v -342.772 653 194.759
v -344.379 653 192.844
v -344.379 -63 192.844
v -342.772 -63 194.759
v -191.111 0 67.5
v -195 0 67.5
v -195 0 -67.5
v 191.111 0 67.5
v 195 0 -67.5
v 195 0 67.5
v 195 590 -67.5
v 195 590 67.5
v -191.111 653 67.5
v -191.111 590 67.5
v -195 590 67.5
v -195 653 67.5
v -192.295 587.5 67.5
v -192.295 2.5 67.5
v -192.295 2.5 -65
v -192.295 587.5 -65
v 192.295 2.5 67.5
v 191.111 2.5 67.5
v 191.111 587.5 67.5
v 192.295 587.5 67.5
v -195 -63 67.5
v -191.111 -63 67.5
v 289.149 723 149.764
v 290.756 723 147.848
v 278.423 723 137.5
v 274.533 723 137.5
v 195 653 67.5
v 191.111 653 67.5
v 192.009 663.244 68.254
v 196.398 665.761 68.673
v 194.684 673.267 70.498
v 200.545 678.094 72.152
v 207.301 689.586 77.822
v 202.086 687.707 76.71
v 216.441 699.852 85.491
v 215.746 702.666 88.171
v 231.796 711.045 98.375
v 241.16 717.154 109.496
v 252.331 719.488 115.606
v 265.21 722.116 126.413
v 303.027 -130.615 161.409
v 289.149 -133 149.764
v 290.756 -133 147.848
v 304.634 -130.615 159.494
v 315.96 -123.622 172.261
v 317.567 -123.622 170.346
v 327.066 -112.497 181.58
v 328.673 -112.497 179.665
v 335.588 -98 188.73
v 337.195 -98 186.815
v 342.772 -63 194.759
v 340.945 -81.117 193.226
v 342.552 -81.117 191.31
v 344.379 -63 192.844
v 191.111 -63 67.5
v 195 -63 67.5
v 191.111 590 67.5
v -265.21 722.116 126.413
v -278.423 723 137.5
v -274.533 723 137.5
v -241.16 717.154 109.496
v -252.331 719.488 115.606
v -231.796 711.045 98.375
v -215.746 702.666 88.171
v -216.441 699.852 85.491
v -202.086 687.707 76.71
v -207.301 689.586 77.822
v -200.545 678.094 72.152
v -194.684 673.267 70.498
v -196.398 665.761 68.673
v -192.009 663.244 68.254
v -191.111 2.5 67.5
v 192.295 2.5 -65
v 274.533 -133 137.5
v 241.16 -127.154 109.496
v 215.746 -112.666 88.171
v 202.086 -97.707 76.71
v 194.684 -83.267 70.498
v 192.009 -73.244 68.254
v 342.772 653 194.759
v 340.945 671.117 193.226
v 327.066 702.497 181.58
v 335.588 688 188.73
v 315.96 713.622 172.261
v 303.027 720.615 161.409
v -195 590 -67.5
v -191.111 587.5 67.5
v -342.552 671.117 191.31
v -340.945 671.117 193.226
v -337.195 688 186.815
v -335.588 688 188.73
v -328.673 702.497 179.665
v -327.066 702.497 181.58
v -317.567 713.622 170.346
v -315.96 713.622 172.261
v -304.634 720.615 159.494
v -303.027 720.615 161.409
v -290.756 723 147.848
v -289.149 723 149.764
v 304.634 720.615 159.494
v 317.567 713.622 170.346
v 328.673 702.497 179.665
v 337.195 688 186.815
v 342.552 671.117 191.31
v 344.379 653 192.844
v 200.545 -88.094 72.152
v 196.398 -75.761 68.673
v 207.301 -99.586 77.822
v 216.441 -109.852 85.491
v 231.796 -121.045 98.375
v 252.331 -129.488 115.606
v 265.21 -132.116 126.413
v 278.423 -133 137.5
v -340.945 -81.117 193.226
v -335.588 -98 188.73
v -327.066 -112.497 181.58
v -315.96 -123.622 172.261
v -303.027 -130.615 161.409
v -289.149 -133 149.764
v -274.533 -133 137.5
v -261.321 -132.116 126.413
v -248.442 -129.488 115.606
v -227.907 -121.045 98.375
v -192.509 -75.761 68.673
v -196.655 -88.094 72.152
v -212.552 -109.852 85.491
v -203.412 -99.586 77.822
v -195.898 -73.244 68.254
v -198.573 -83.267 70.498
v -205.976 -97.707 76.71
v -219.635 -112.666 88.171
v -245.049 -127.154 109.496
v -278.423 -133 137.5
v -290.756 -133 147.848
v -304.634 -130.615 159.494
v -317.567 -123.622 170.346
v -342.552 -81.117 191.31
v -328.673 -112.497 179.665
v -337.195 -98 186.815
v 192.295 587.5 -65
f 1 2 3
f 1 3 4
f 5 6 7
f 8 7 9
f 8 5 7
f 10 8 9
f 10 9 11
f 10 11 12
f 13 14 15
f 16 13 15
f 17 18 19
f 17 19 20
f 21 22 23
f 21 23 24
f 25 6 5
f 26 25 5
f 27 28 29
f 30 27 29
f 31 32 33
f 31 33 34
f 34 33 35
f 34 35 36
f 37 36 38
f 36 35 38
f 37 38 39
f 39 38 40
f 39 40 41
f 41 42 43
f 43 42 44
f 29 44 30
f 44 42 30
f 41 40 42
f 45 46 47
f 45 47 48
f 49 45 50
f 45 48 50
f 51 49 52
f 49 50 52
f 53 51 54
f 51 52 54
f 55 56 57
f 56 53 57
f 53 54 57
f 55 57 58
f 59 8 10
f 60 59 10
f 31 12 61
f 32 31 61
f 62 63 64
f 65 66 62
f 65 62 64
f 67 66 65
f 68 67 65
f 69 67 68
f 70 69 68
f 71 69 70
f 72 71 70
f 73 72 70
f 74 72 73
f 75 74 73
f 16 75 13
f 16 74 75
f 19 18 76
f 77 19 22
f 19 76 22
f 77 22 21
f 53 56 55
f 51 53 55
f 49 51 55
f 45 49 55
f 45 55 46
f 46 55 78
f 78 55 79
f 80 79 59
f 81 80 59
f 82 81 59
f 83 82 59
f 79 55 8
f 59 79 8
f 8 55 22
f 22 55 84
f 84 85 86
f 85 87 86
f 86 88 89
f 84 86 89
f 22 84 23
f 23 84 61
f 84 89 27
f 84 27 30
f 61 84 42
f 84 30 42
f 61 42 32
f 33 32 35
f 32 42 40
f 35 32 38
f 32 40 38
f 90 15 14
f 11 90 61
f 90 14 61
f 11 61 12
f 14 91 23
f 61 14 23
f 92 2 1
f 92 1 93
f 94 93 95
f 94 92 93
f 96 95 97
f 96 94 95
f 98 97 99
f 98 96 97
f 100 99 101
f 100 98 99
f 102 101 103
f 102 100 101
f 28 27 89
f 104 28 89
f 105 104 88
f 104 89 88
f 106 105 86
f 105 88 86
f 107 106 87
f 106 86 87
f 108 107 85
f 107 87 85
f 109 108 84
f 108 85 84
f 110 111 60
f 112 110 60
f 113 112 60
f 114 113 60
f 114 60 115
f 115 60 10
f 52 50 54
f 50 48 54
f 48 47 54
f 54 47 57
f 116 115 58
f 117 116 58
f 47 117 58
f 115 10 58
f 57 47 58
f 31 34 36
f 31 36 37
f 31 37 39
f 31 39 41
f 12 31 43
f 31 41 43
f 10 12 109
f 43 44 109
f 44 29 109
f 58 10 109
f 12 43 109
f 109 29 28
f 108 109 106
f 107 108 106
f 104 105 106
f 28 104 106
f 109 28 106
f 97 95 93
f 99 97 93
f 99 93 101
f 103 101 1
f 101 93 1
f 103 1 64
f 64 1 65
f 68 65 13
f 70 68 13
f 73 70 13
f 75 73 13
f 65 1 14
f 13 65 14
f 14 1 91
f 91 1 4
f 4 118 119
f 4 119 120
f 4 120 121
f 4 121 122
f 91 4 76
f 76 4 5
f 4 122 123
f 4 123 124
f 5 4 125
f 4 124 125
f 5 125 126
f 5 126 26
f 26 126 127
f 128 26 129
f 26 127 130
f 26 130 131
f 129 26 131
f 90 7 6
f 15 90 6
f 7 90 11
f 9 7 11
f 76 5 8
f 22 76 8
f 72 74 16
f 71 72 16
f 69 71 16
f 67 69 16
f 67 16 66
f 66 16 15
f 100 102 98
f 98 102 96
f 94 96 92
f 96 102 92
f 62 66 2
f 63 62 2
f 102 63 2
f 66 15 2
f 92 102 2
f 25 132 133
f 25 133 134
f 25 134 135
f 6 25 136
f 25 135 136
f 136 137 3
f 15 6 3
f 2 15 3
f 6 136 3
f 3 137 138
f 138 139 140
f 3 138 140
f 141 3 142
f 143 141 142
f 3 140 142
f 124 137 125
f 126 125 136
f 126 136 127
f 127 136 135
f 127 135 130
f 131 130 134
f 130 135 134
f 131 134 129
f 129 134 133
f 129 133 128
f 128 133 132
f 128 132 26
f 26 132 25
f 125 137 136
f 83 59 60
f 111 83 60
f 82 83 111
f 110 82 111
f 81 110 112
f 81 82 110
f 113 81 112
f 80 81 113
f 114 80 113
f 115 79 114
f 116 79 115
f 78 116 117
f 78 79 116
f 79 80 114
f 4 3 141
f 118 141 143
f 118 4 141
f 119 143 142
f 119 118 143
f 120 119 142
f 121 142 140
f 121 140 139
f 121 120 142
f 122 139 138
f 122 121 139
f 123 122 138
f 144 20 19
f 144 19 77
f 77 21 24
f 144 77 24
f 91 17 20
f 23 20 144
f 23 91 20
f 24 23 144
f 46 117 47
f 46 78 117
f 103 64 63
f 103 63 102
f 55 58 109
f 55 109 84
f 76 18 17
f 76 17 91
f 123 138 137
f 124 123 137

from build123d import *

# Parameters (mm, degrees)
F0_W         = 390
F0_H         = 135
F1_DEPTH     = 590
F2_W         = 384.5905684095
F2_H         = 585
F3_DEPTH     = 132.5
F5_DEPTH     = 590
F7_DEPTH     = 133
F8_T1_DEPTH  = 352.5
F8_T3_DEPTH  = 353.8893095672
F8_T5_DEPTH  = 353.8893095672
F8_T7_DEPTH  = 352.5
F10_DEPTH    = 133
F11_T1_DEPTH = 352.5
F11_T3_DEPTH = 353.8893095672
F11_T5_DEPTH = 353.8893095672
F11_T7_DEPTH = 352.5


# Not quite as in the source:
# - a fillet or chamfer that OpenCascade refuses, or shapes differently, is made with other operations: its cross-section is extruded or revolved along the edge and cut away or added


with BuildPart() as f1:
    # F0 (on Front) → F1 (new body)
    with BuildSketch(Plane.XZ):
        Rectangle(F0_W, F0_H)
    extrude(amount=-F1_DEPTH)

    # F2 (on face) → F3 (cut)
    with BuildSketch(Plane.XY.offset(67.5)):
        with Locations((0, 295)):
            Rectangle(F2_W, F2_H)
    extrude(amount=-F3_DEPTH, mode=Mode.SUBTRACT)

    # F4 (on face) → F5 (join)
    with BuildSketch(Plane.XZ):
        Polygon((-195, 67.5), (-191.1106904328, 67.5), (-342.771697384, 194.7586949967), (-344.3786664082, 192.8435838889), align=None)
        Polygon((191.1106904328, 67.5), (195, 67.5), (344.3786664082, 192.8435838889), (342.771697384, 194.7586949967), align=None)
    extrude(amount=-F5_DEPTH)

    # F6 (on face) → F7 (join)
    with BuildSketch(Plane(origin=(0, 590, 0), x_dir=(-1, 0, 0), z_dir=(0, 1, 0))):
        Polygon((195, 67.5), (344.3786664082, 192.8435838889), (342.771697384, 194.7586949967), (191.1106904328, 67.5), align=None)
        Polygon((-344.3786664082, 192.8435838889), (-195, 67.5), (-191.1106904328, 67.5), (-342.771697384, 194.7586949967), align=None)
    extrude(amount=F7_DEPTH)

    # F8: fillet of radius 70 on 4 edges, made by hand

    # F8_s2 → F8_t1 (cut)
    with BuildSketch(Plane(origin=(-66.762759706, 0, 79.5647587312), x_dir=(0, 1, 0), z_dir=(0.6427876097, 0, -0.7660444431))):
        with BuildLine():
            ThreePointArc((723, 317.766830062), (702.4974746831, 367.2643047451), (653, 387.766830062))
            Line((653, 387.766830062), (723, 387.766830062))
            Line((723, 387.766830062), (723, 317.766830062))
        make_face()
    extrude(amount=F8_T1_DEPTH, mode=Mode.SUBTRACT)

    # F8_s4 → F8_t3 (cut)
    with BuildSketch(Plane.YZ.offset(16.1106904328)):
        with BuildLine():
            ThreePointArc((653, 67.5), (702.4974746831, 88.0025253169), (723, 137.5))
            Line((723, 137.5), (723, 67.5))
            Line((723, 67.5), (653, 67.5))
        make_face()
    extrude(amount=F8_T3_DEPTH, mode=Mode.SUBTRACT)

    # F8_s6 → F8_t5 (cut)
    with BuildSketch(Plane.YZ.offset(-370)):
        with BuildLine():
            ThreePointArc((723, 137.5), (702.4974746831, 88.0025253169), (653, 67.5))
            Line((653, 67.5), (723, 67.5))
            Line((723, 67.5), (723, 137.5))
        make_face()
    extrude(amount=F8_T5_DEPTH, mode=Mode.SUBTRACT)

    # F8_s8 → F8_t7 (cut)
    with BuildSketch(Plane(origin=(-159.8198727085, 0, -190.4659074683), x_dir=(0, 1, 0), z_dir=(0.6427876097, 0, 0.7660444431))):
        with BuildLine():
            ThreePointArc((653, 387.766830062), (702.4974746831, 367.2643047451), (723, 317.766830062))
            Line((723, 317.766830062), (723, 387.766830062))
            Line((723, 387.766830062), (653, 387.766830062))
        make_face()
    extrude(amount=F8_T7_DEPTH, mode=Mode.SUBTRACT)

    # F9 (on face) → F10 (join)
    with BuildSketch(Plane.XZ):
        Polygon((342.771697384, 194.7586949967), (191.1106904328, 67.5), (195, 67.5), (344.3786664082, 192.8435838889), align=None)
        Polygon((-195, 67.5), (-191.1106904328, 67.5), (-342.771697384, 194.7586949967), (-344.3786664082, 192.8435838889), align=None)
    extrude(amount=F10_DEPTH)

    # F11: fillet of radius 70 on 4 edges, made by hand

    # F11_s2 → F11_t1 (cut)
    with BuildSketch(Plane(origin=(66.762759706, 0, 79.5647587312), x_dir=(0, 1, 0), z_dir=(-0.6427876097, 0, -0.7660444431))):
        with BuildLine():
            ThreePointArc((-63, -387.766830062), (-112.4974746831, -367.2643047451), (-133, -317.766830062))
            Line((-133, -317.766830062), (-133, -387.766830062))
            Line((-133, -387.766830062), (-63, -387.766830062))
        make_face()
    extrude(amount=F11_T1_DEPTH, mode=Mode.SUBTRACT)

    # F11_s4 → F11_t3 (cut)
    with BuildSketch(Plane.YZ.offset(-370)):
        with BuildLine():
            ThreePointArc((-133, 137.5), (-112.4974746831, 88.0025253169), (-63, 67.5))
            Line((-63, 67.5), (-133, 67.5))
            Line((-133, 67.5), (-133, 137.5))
        make_face()
    extrude(amount=F11_T3_DEPTH, mode=Mode.SUBTRACT)

    # F11_s6 → F11_t5 (cut)
    with BuildSketch(Plane.YZ.offset(16.1106904328)):
        with BuildLine():
            ThreePointArc((-63, 67.5), (-112.4974746831, 88.0025253169), (-133, 137.5))
            Line((-133, 137.5), (-133, 67.5))
            Line((-133, 67.5), (-63, 67.5))
        make_face()
    extrude(amount=F11_T5_DEPTH, mode=Mode.SUBTRACT)

    # F11_s8 → F11_t7 (cut)
    with BuildSketch(Plane(origin=(159.8198727085, 0, -190.4659074683), x_dir=(0, 1, 0), z_dir=(-0.6427876097, 0, 0.7660444431))):
        with BuildLine():
            ThreePointArc((-133, -317.766830062), (-112.4974746831, -367.2643047451), (-63, -387.766830062))
            Line((-63, -387.766830062), (-133, -387.766830062))
            Line((-133, -387.766830062), (-133, -317.766830062))
        make_face()
    extrude(amount=F11_T7_DEPTH, mode=Mode.SUBTRACT)


solid = f1.part
